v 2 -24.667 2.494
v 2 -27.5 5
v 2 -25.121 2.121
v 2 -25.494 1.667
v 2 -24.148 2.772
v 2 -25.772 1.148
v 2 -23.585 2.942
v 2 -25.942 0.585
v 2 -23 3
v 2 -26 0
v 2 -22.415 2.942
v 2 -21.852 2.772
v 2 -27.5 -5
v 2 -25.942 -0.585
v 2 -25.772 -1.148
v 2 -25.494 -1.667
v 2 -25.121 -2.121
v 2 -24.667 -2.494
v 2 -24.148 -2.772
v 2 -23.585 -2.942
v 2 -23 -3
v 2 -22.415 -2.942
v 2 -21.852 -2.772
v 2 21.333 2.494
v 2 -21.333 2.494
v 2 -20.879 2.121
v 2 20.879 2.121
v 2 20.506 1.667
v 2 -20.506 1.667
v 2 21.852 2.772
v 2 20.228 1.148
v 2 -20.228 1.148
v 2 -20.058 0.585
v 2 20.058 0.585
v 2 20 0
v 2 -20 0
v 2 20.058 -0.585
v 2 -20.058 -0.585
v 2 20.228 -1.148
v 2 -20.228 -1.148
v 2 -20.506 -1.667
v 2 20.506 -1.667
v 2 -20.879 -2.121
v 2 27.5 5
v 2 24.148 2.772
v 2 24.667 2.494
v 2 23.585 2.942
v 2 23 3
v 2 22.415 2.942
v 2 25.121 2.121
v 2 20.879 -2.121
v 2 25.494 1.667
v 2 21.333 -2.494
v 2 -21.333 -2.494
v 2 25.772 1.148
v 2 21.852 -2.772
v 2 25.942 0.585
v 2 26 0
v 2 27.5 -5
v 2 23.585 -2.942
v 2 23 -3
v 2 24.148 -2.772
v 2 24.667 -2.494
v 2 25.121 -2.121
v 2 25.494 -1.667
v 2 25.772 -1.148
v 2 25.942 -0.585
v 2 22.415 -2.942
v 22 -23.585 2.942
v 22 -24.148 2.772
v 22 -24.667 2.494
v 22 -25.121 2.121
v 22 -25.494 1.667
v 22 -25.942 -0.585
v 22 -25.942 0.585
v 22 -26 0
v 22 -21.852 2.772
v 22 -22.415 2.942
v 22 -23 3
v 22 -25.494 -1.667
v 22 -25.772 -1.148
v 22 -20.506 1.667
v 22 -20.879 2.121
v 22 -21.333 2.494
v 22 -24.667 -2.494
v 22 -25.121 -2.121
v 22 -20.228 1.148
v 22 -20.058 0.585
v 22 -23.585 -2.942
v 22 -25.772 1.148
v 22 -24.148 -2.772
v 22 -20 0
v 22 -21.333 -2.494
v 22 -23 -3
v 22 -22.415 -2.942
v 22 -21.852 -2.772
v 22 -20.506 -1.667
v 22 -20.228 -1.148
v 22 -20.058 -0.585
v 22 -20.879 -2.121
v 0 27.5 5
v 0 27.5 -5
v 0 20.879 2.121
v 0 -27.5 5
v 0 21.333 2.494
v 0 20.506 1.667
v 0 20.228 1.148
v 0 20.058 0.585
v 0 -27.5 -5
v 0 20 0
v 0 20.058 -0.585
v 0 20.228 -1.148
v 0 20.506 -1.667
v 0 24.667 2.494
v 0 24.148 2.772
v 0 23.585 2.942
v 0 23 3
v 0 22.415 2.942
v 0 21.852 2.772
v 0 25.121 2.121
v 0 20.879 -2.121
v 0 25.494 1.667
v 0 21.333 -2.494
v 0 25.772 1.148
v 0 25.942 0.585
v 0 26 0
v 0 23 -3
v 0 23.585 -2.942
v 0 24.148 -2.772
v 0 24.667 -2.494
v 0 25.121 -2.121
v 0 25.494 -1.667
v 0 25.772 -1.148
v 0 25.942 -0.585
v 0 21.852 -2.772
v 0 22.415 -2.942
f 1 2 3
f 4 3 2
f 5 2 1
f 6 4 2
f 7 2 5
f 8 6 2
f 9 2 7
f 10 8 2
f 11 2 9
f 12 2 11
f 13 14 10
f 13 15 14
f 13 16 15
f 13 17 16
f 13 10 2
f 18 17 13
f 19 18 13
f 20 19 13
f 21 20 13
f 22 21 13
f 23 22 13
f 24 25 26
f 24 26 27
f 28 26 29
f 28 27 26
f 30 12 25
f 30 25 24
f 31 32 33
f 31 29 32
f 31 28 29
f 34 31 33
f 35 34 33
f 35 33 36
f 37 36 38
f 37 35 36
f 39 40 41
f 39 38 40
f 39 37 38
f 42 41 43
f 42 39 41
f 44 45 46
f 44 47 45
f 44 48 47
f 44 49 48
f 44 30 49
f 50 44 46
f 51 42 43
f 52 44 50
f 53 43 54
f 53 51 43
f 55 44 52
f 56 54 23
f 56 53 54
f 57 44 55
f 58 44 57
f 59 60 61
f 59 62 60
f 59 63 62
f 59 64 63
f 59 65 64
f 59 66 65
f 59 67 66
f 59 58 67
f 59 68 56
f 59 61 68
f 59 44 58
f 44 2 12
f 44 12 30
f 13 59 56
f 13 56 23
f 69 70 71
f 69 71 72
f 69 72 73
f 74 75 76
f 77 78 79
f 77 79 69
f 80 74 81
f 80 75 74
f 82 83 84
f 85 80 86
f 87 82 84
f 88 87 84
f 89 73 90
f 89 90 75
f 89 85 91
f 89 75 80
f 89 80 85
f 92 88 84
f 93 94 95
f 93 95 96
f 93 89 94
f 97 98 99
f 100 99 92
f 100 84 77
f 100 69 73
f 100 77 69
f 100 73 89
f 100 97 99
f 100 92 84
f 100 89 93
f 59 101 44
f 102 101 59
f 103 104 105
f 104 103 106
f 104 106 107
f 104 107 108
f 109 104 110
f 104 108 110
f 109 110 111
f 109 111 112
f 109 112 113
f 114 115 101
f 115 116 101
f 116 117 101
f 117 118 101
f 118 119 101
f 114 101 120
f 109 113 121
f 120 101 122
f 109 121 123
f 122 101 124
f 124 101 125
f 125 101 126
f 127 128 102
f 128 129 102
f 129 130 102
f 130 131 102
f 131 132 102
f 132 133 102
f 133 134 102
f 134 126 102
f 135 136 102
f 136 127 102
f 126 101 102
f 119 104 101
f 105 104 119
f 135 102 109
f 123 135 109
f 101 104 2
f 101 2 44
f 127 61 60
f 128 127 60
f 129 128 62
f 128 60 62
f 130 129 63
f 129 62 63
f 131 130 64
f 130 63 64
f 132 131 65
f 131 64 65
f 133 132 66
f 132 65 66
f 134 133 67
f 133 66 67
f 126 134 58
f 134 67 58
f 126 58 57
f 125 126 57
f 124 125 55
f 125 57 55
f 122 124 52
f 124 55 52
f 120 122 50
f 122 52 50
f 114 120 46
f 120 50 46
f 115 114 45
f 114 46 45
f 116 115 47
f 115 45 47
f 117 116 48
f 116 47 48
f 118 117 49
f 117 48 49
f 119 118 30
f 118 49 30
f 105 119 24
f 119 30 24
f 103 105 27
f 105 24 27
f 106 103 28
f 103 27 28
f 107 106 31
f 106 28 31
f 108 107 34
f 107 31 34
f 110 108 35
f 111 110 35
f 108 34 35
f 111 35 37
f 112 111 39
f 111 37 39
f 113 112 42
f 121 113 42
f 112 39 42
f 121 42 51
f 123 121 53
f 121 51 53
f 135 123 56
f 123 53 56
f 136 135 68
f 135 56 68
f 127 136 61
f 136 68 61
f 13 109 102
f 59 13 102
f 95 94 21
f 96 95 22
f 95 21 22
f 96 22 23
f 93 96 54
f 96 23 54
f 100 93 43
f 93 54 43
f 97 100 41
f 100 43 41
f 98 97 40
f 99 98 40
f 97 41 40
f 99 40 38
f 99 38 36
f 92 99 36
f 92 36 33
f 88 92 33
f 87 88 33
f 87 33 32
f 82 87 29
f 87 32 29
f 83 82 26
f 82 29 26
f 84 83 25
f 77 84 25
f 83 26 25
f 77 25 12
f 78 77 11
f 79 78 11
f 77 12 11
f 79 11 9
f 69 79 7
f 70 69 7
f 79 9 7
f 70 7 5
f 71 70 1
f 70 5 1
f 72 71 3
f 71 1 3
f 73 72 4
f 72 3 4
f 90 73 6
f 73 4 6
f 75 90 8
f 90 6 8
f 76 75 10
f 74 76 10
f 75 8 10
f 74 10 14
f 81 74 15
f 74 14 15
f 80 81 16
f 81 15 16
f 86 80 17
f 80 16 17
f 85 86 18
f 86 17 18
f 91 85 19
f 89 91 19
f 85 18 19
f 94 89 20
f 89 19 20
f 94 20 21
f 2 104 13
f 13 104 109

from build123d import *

# Parameters (mm, degrees)
SKETCH1_W           = 10
SKETCH1_H           = 55
BOSS_EXTRUDE1_DEPTH = 2
SKETCH2_R           = 3
CUT_EXTRUDE1_DEPTH  = 2
SKETCH3_R           = 3
BOSS_EXTRUDE2_DEPTH = 20


with BuildPart() as part:
    # Sketch1 → Boss-Extrude1 (new body)
    with BuildSketch(Plane(origin=(0, 0, 0), x_dir=(0, 0, -1), z_dir=(1, 0, 0))):
        Rectangle(SKETCH1_W, SKETCH1_H)
    extrude(amount=BOSS_EXTRUDE1_DEPTH)

    # Sketch2 → Cut-Extrude1 (cut)
    with BuildSketch(Plane(origin=(2, 0, 0), x_dir=(0, 0, -1), z_dir=(1, 0, 0))):
        with Locations((0, 23)):
            Circle(SKETCH2_R)
    extrude(amount=-CUT_EXTRUDE1_DEPTH, mode=Mode.SUBTRACT)

    # Sketch3 → Boss-Extrude2 (add)
    with BuildSketch(Plane(origin=(2, 0, 0), x_dir=(0, 0, -1), z_dir=(1, 0, 0))):
        with Locations((0, -23)):
            Circle(SKETCH3_R)
    extrude(amount=BOSS_EXTRUDE2_DEPTH)


solid = part.part
